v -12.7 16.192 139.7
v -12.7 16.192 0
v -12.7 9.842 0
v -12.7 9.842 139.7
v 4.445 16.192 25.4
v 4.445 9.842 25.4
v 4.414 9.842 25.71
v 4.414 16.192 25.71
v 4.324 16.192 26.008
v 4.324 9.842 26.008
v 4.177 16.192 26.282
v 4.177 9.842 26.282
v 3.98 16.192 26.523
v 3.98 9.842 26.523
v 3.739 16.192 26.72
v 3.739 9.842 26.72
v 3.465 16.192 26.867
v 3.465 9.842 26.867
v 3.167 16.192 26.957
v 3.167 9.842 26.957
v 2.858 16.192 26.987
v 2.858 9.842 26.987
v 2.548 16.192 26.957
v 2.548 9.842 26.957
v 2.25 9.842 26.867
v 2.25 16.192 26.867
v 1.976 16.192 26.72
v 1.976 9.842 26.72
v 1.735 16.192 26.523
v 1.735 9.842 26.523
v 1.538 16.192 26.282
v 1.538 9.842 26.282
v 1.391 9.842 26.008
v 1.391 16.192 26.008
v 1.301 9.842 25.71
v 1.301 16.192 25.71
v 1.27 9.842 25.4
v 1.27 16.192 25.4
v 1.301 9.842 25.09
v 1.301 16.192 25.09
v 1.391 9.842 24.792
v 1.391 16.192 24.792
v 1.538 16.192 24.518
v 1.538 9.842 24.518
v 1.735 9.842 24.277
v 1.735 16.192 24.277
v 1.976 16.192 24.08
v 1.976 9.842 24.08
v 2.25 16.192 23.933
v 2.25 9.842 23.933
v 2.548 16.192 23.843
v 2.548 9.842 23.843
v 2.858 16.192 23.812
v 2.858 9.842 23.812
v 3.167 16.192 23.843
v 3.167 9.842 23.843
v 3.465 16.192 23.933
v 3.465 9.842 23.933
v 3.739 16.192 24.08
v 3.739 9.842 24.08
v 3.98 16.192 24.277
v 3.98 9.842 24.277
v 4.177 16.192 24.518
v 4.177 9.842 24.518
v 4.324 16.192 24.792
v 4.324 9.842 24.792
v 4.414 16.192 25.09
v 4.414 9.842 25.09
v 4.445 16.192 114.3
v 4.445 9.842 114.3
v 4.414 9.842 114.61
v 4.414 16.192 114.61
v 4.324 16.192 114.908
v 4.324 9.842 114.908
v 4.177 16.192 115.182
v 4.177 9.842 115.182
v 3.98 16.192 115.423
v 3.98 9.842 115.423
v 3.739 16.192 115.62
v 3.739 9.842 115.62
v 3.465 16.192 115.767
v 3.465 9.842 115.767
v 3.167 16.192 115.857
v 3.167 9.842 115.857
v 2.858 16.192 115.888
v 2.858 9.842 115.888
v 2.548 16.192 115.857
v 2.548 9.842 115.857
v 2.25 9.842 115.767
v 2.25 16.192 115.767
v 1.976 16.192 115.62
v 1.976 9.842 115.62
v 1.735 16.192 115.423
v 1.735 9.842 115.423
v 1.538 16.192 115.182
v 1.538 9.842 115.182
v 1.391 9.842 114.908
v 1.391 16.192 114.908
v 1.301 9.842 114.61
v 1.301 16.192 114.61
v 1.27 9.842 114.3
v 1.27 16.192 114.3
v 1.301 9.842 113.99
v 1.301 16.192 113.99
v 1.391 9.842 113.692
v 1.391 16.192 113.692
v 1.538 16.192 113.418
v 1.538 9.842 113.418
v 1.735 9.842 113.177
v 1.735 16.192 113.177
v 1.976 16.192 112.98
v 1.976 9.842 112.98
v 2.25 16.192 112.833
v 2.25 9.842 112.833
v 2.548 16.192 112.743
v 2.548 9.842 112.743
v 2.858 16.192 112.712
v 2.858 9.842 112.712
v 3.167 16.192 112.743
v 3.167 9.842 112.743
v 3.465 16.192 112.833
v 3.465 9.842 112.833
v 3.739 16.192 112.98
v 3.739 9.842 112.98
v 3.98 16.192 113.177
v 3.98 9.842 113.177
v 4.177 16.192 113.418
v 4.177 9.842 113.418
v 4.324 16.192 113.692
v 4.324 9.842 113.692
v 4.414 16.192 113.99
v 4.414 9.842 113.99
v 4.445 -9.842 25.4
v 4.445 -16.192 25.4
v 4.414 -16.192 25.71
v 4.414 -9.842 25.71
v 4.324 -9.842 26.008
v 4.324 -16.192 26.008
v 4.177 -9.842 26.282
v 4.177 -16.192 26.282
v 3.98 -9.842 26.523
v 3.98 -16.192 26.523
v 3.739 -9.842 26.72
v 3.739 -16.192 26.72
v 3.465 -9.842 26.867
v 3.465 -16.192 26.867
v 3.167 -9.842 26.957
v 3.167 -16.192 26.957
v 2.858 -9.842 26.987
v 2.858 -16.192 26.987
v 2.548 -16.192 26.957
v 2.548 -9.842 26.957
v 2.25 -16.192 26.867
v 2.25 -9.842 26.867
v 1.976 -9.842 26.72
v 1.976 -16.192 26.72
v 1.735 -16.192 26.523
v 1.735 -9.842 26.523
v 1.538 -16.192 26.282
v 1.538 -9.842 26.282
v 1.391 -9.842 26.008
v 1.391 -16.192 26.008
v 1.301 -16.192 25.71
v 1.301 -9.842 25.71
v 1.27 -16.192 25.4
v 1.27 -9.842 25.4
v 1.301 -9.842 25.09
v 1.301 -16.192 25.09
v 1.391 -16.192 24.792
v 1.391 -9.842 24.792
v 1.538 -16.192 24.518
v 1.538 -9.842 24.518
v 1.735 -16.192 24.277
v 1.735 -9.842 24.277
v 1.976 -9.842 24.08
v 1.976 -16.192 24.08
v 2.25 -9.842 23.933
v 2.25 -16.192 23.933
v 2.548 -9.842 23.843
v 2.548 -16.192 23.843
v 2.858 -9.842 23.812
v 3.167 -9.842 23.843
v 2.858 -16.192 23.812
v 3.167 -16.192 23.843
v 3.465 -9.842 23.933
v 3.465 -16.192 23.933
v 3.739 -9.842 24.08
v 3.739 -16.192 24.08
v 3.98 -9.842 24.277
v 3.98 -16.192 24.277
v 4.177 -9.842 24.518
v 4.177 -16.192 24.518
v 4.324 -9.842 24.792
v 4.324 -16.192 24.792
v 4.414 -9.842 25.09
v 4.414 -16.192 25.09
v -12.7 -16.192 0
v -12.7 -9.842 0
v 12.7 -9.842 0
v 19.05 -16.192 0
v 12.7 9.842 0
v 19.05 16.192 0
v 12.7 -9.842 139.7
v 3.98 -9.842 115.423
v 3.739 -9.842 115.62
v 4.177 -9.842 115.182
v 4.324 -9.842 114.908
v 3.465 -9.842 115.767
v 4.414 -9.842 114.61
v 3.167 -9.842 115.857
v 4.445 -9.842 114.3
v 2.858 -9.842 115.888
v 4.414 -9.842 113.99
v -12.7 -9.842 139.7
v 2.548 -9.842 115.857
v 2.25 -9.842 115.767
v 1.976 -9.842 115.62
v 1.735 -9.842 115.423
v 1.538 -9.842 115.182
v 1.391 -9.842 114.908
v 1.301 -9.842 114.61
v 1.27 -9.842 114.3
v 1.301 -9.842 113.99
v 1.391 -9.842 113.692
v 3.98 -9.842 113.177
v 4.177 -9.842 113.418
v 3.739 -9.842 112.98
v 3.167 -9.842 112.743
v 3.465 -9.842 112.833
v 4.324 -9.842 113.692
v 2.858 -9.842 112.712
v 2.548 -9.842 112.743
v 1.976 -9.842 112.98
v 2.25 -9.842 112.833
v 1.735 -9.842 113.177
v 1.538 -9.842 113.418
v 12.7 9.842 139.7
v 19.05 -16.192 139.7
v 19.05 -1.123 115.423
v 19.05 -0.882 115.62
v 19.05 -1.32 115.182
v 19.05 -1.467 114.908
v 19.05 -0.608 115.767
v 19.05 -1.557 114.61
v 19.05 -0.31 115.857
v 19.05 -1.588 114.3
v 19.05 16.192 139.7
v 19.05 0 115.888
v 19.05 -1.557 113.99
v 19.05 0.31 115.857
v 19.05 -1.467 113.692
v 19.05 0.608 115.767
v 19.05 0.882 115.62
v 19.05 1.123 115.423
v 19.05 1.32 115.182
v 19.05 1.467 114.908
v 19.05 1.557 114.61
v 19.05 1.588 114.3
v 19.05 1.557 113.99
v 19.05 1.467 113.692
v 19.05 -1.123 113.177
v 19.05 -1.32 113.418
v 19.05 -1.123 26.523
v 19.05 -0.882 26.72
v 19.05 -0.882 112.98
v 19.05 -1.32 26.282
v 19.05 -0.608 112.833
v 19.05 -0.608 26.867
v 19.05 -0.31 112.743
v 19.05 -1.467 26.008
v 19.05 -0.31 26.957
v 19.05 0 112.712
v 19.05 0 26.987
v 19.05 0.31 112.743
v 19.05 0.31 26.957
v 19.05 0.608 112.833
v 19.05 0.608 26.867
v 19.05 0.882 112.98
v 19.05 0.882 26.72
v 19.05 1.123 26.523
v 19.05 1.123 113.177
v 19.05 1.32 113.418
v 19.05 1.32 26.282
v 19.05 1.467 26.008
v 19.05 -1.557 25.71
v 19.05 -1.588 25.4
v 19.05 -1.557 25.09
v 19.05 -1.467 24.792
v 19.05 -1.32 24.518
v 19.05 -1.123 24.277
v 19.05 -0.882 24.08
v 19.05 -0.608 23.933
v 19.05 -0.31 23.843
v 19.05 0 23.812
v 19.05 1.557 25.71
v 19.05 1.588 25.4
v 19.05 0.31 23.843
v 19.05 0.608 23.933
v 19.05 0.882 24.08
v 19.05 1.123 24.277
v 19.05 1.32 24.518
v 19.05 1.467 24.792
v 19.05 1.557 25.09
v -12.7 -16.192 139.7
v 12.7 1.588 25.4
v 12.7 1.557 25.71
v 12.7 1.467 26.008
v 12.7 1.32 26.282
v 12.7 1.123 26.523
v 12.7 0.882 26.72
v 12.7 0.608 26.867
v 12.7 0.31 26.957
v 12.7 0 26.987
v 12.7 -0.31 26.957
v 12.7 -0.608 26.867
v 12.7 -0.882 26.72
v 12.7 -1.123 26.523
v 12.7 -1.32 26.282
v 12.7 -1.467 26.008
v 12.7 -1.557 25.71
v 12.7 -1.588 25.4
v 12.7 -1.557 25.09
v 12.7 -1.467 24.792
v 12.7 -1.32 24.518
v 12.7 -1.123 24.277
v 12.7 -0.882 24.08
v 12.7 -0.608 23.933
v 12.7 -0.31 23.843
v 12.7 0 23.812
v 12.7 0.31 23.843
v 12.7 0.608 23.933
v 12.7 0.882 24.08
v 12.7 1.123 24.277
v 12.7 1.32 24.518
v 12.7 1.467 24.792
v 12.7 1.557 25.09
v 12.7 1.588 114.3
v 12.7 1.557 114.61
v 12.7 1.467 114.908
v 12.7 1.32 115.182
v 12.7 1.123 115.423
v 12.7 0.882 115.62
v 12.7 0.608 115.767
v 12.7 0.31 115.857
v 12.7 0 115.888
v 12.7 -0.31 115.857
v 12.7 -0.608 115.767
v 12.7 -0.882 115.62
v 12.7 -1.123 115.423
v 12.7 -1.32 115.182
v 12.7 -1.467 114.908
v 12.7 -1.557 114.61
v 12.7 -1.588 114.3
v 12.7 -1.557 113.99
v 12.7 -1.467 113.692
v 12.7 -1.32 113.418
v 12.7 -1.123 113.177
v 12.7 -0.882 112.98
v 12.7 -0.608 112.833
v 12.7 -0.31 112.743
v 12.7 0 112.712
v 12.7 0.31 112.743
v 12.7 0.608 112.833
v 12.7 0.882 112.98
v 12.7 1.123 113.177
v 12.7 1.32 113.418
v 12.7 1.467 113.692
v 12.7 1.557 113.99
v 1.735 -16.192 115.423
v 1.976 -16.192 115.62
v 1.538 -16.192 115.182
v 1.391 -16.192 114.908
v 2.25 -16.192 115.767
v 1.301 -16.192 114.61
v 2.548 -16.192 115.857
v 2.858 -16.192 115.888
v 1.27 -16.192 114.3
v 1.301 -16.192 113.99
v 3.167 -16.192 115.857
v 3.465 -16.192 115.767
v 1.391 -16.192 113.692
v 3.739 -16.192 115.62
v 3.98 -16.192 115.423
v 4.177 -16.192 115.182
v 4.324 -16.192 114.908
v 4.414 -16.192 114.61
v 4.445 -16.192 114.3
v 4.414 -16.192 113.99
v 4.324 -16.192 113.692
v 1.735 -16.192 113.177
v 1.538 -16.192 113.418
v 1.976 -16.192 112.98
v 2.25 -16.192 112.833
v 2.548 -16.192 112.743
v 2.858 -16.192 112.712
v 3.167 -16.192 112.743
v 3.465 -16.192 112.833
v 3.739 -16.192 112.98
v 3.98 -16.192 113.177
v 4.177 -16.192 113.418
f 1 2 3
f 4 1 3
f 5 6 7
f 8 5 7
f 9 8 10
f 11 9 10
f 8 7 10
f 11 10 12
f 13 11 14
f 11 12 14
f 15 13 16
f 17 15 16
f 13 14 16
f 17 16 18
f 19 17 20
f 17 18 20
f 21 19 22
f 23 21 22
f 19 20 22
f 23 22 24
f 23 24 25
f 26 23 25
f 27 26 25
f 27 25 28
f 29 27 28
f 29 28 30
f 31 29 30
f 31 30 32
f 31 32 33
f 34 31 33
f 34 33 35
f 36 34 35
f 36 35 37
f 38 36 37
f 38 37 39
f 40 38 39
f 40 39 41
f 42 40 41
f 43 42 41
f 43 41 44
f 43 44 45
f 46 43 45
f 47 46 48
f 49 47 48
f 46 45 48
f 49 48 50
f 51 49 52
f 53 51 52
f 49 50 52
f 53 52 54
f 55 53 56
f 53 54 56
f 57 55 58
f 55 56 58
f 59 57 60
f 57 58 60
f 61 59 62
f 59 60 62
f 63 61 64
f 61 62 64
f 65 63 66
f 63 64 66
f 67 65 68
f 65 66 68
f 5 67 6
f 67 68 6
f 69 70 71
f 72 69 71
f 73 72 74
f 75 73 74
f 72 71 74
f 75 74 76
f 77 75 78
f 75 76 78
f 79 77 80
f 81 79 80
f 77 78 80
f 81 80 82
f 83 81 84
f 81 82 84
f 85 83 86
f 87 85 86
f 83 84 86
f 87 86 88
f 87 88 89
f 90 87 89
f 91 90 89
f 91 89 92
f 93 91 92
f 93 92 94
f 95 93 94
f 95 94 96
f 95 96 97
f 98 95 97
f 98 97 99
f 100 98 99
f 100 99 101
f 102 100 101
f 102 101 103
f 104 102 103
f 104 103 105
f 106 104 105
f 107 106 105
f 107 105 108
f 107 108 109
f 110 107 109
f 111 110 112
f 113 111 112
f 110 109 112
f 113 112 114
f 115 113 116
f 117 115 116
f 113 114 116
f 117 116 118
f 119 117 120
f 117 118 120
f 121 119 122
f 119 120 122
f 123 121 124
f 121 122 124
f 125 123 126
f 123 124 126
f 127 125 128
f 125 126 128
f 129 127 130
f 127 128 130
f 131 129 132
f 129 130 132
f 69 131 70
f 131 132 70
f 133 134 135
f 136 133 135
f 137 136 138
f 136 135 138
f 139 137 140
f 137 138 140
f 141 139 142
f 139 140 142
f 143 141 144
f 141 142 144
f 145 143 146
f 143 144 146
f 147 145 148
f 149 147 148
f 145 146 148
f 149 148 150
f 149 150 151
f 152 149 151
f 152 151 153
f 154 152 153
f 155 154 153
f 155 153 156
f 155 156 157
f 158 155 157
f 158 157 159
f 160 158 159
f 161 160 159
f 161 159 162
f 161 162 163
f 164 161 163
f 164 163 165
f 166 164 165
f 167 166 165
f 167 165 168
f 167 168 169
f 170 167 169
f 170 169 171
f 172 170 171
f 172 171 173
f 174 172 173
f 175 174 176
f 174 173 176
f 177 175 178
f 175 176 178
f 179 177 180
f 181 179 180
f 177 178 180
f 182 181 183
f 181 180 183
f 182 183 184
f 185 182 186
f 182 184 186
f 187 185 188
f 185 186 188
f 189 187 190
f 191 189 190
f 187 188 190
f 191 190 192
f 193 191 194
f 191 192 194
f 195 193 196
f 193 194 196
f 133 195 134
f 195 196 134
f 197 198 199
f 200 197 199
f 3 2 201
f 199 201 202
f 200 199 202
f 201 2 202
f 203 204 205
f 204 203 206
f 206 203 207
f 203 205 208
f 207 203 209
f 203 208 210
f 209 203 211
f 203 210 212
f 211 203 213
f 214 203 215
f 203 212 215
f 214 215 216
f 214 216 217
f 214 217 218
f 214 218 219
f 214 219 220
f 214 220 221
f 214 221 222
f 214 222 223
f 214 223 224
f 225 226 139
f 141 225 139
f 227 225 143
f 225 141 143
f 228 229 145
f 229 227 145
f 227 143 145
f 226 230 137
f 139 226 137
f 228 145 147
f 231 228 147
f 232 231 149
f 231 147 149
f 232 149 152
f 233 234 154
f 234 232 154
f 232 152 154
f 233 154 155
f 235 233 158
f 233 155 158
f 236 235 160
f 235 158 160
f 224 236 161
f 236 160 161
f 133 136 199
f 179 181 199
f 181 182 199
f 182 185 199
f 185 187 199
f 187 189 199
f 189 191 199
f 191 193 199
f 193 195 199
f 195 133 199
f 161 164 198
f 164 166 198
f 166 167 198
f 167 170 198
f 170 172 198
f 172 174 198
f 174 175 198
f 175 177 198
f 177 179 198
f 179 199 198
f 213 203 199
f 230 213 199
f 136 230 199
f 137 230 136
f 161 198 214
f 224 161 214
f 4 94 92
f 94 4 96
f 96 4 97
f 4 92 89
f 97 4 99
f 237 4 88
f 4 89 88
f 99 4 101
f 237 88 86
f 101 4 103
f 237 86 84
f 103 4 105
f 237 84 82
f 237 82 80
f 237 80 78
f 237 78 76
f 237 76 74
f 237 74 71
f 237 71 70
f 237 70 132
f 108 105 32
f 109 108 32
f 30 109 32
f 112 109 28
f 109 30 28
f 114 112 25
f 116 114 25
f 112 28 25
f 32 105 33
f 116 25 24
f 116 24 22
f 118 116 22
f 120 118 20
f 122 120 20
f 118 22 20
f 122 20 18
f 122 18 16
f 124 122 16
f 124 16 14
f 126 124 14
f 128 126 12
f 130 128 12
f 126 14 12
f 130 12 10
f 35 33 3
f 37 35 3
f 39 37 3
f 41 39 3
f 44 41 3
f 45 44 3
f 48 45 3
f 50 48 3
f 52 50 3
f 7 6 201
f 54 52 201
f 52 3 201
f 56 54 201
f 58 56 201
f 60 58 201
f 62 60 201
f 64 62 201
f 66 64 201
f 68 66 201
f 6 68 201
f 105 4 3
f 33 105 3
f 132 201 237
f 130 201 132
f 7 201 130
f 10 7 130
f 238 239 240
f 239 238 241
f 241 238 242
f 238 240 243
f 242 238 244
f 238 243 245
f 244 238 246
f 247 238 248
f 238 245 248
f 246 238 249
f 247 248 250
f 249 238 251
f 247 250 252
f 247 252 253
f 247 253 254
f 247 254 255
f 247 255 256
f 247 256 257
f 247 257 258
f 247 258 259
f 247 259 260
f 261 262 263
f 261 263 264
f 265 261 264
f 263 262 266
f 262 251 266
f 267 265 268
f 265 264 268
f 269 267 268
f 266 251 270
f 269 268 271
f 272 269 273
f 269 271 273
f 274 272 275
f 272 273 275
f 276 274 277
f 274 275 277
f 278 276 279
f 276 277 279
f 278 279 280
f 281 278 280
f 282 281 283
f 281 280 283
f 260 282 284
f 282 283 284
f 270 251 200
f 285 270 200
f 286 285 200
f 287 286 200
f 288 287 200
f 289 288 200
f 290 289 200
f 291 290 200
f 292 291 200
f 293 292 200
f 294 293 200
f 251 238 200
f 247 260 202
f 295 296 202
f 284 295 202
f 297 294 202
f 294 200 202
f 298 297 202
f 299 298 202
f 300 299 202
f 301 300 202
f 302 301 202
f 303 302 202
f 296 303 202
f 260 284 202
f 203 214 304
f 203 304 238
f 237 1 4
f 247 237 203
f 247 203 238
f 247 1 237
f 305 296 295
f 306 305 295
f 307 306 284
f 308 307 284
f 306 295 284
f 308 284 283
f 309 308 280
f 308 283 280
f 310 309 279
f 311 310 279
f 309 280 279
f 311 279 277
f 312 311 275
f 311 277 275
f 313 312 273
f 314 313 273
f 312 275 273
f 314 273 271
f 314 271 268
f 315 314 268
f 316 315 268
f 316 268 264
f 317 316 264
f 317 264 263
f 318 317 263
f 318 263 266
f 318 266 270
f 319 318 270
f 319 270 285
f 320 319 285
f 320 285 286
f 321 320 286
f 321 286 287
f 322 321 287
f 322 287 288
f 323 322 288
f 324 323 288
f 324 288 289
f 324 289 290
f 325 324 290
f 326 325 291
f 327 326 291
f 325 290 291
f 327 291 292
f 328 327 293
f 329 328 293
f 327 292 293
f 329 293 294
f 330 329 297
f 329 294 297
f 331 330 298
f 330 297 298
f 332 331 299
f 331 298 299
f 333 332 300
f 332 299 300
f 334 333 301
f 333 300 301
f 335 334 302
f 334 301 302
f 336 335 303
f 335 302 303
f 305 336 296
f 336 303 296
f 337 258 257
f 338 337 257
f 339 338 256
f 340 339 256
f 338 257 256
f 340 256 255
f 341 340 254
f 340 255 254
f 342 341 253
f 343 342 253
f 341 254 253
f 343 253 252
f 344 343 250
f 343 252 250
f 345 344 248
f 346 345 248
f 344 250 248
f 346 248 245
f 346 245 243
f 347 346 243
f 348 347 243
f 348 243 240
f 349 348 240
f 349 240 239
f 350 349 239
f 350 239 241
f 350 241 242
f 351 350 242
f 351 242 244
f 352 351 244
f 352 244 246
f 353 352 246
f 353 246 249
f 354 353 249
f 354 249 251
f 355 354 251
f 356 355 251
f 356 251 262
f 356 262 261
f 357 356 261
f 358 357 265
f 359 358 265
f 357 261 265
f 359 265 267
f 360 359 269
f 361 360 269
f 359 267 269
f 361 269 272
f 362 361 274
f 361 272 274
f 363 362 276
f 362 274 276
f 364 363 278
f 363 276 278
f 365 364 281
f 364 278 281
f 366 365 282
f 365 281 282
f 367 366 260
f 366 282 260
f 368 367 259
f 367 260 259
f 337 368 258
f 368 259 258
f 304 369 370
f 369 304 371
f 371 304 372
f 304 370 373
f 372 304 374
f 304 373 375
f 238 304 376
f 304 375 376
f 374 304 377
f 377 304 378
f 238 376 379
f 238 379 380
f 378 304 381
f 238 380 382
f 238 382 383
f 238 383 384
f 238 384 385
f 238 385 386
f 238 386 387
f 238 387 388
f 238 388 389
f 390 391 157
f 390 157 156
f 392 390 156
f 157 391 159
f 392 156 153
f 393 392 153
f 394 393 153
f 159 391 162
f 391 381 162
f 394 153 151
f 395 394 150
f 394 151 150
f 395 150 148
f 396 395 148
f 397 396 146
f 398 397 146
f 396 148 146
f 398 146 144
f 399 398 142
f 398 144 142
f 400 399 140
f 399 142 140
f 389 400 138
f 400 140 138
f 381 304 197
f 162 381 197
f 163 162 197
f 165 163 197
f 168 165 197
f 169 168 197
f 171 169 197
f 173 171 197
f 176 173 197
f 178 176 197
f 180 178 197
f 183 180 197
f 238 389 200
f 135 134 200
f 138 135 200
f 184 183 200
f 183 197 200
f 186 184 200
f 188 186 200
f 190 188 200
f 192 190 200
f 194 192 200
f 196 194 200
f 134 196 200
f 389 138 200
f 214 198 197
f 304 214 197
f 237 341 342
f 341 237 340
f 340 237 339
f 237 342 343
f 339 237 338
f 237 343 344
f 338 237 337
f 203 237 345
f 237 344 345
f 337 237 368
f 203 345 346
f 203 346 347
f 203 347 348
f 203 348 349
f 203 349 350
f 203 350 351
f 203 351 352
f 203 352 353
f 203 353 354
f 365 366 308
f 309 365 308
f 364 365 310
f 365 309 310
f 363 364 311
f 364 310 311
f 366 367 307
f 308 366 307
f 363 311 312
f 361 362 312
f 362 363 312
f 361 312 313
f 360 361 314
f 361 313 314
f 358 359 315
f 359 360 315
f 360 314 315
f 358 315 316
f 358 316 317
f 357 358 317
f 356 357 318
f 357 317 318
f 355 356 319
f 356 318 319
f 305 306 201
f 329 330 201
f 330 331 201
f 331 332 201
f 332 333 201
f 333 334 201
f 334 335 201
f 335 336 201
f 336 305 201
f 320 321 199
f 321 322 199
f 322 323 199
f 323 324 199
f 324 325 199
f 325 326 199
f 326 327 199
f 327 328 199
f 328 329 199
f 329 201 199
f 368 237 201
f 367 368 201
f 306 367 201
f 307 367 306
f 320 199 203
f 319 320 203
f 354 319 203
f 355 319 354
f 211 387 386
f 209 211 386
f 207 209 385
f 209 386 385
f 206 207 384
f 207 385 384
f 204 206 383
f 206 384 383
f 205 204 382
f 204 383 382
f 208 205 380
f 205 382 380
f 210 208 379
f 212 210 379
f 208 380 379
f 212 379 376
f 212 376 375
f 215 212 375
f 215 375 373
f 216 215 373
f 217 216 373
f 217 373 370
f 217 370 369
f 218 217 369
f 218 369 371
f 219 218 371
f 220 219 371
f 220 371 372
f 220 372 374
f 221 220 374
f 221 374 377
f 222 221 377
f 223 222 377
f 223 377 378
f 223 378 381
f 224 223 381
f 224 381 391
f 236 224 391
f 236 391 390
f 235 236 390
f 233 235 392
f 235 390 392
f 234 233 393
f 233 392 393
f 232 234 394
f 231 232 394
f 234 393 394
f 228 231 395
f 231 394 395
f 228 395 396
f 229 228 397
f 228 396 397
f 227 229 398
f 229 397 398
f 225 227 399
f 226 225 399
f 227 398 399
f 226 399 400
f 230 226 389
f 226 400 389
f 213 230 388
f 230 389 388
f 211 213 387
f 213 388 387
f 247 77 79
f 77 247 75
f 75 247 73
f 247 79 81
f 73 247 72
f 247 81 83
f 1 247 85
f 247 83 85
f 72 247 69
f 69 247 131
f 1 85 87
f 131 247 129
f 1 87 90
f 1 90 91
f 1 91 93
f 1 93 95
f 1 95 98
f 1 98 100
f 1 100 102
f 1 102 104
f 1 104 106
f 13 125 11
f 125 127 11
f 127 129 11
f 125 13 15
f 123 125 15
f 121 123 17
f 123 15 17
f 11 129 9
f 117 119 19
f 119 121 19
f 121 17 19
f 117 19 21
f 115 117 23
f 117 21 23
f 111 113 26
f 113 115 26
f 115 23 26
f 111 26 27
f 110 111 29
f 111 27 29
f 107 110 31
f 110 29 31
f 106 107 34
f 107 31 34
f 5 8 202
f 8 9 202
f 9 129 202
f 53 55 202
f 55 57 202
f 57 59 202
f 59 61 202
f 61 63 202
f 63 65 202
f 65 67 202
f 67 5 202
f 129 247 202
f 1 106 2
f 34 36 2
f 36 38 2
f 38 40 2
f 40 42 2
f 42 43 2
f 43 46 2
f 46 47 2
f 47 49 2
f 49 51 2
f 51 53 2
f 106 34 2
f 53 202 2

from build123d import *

# Parameters (mm, degrees)
F1_DEPTH = 139.7
F2_R     = 1.5875
F3_DEPTH = 31.751
F4_R     = 1.5875
F5_DEPTH = 32.386


with BuildPart() as f1:
    # F0 (on Top) → F1 (new body)
    with BuildSketch(Plane.XY):
        Polygon((12.7, -9.8425), (-12.7, -9.8425), (-12.7, -16.1925), (19.05, -16.1925), (19.05, 16.1925), (-12.7, 16.1925), (-12.7, 9.8425), (12.7, 9.8425), align=None)
    extrude(amount=F1_DEPTH)

    # F2 (on face) → F3 (cut, through all)
    with BuildSketch(Plane.YZ.offset(19.05)):
        with Locations((0, 114.3)):
            Circle(F2_R)
        with Locations((0, 25.4)):
            Circle(F2_R)
    extrude(amount=-F3_DEPTH, mode=Mode.SUBTRACT)

    # F4 (on face) → F5 (cut, through all)
    with BuildSketch(Plane.XZ.offset(16.1925)):
        with Locations((2.8575, 114.3)):
            Circle(F4_R)
        with Locations((2.8575, 25.4)):
            Circle(F4_R)
    extrude(amount=-F5_DEPTH, mode=Mode.SUBTRACT)


solid = f1.part
